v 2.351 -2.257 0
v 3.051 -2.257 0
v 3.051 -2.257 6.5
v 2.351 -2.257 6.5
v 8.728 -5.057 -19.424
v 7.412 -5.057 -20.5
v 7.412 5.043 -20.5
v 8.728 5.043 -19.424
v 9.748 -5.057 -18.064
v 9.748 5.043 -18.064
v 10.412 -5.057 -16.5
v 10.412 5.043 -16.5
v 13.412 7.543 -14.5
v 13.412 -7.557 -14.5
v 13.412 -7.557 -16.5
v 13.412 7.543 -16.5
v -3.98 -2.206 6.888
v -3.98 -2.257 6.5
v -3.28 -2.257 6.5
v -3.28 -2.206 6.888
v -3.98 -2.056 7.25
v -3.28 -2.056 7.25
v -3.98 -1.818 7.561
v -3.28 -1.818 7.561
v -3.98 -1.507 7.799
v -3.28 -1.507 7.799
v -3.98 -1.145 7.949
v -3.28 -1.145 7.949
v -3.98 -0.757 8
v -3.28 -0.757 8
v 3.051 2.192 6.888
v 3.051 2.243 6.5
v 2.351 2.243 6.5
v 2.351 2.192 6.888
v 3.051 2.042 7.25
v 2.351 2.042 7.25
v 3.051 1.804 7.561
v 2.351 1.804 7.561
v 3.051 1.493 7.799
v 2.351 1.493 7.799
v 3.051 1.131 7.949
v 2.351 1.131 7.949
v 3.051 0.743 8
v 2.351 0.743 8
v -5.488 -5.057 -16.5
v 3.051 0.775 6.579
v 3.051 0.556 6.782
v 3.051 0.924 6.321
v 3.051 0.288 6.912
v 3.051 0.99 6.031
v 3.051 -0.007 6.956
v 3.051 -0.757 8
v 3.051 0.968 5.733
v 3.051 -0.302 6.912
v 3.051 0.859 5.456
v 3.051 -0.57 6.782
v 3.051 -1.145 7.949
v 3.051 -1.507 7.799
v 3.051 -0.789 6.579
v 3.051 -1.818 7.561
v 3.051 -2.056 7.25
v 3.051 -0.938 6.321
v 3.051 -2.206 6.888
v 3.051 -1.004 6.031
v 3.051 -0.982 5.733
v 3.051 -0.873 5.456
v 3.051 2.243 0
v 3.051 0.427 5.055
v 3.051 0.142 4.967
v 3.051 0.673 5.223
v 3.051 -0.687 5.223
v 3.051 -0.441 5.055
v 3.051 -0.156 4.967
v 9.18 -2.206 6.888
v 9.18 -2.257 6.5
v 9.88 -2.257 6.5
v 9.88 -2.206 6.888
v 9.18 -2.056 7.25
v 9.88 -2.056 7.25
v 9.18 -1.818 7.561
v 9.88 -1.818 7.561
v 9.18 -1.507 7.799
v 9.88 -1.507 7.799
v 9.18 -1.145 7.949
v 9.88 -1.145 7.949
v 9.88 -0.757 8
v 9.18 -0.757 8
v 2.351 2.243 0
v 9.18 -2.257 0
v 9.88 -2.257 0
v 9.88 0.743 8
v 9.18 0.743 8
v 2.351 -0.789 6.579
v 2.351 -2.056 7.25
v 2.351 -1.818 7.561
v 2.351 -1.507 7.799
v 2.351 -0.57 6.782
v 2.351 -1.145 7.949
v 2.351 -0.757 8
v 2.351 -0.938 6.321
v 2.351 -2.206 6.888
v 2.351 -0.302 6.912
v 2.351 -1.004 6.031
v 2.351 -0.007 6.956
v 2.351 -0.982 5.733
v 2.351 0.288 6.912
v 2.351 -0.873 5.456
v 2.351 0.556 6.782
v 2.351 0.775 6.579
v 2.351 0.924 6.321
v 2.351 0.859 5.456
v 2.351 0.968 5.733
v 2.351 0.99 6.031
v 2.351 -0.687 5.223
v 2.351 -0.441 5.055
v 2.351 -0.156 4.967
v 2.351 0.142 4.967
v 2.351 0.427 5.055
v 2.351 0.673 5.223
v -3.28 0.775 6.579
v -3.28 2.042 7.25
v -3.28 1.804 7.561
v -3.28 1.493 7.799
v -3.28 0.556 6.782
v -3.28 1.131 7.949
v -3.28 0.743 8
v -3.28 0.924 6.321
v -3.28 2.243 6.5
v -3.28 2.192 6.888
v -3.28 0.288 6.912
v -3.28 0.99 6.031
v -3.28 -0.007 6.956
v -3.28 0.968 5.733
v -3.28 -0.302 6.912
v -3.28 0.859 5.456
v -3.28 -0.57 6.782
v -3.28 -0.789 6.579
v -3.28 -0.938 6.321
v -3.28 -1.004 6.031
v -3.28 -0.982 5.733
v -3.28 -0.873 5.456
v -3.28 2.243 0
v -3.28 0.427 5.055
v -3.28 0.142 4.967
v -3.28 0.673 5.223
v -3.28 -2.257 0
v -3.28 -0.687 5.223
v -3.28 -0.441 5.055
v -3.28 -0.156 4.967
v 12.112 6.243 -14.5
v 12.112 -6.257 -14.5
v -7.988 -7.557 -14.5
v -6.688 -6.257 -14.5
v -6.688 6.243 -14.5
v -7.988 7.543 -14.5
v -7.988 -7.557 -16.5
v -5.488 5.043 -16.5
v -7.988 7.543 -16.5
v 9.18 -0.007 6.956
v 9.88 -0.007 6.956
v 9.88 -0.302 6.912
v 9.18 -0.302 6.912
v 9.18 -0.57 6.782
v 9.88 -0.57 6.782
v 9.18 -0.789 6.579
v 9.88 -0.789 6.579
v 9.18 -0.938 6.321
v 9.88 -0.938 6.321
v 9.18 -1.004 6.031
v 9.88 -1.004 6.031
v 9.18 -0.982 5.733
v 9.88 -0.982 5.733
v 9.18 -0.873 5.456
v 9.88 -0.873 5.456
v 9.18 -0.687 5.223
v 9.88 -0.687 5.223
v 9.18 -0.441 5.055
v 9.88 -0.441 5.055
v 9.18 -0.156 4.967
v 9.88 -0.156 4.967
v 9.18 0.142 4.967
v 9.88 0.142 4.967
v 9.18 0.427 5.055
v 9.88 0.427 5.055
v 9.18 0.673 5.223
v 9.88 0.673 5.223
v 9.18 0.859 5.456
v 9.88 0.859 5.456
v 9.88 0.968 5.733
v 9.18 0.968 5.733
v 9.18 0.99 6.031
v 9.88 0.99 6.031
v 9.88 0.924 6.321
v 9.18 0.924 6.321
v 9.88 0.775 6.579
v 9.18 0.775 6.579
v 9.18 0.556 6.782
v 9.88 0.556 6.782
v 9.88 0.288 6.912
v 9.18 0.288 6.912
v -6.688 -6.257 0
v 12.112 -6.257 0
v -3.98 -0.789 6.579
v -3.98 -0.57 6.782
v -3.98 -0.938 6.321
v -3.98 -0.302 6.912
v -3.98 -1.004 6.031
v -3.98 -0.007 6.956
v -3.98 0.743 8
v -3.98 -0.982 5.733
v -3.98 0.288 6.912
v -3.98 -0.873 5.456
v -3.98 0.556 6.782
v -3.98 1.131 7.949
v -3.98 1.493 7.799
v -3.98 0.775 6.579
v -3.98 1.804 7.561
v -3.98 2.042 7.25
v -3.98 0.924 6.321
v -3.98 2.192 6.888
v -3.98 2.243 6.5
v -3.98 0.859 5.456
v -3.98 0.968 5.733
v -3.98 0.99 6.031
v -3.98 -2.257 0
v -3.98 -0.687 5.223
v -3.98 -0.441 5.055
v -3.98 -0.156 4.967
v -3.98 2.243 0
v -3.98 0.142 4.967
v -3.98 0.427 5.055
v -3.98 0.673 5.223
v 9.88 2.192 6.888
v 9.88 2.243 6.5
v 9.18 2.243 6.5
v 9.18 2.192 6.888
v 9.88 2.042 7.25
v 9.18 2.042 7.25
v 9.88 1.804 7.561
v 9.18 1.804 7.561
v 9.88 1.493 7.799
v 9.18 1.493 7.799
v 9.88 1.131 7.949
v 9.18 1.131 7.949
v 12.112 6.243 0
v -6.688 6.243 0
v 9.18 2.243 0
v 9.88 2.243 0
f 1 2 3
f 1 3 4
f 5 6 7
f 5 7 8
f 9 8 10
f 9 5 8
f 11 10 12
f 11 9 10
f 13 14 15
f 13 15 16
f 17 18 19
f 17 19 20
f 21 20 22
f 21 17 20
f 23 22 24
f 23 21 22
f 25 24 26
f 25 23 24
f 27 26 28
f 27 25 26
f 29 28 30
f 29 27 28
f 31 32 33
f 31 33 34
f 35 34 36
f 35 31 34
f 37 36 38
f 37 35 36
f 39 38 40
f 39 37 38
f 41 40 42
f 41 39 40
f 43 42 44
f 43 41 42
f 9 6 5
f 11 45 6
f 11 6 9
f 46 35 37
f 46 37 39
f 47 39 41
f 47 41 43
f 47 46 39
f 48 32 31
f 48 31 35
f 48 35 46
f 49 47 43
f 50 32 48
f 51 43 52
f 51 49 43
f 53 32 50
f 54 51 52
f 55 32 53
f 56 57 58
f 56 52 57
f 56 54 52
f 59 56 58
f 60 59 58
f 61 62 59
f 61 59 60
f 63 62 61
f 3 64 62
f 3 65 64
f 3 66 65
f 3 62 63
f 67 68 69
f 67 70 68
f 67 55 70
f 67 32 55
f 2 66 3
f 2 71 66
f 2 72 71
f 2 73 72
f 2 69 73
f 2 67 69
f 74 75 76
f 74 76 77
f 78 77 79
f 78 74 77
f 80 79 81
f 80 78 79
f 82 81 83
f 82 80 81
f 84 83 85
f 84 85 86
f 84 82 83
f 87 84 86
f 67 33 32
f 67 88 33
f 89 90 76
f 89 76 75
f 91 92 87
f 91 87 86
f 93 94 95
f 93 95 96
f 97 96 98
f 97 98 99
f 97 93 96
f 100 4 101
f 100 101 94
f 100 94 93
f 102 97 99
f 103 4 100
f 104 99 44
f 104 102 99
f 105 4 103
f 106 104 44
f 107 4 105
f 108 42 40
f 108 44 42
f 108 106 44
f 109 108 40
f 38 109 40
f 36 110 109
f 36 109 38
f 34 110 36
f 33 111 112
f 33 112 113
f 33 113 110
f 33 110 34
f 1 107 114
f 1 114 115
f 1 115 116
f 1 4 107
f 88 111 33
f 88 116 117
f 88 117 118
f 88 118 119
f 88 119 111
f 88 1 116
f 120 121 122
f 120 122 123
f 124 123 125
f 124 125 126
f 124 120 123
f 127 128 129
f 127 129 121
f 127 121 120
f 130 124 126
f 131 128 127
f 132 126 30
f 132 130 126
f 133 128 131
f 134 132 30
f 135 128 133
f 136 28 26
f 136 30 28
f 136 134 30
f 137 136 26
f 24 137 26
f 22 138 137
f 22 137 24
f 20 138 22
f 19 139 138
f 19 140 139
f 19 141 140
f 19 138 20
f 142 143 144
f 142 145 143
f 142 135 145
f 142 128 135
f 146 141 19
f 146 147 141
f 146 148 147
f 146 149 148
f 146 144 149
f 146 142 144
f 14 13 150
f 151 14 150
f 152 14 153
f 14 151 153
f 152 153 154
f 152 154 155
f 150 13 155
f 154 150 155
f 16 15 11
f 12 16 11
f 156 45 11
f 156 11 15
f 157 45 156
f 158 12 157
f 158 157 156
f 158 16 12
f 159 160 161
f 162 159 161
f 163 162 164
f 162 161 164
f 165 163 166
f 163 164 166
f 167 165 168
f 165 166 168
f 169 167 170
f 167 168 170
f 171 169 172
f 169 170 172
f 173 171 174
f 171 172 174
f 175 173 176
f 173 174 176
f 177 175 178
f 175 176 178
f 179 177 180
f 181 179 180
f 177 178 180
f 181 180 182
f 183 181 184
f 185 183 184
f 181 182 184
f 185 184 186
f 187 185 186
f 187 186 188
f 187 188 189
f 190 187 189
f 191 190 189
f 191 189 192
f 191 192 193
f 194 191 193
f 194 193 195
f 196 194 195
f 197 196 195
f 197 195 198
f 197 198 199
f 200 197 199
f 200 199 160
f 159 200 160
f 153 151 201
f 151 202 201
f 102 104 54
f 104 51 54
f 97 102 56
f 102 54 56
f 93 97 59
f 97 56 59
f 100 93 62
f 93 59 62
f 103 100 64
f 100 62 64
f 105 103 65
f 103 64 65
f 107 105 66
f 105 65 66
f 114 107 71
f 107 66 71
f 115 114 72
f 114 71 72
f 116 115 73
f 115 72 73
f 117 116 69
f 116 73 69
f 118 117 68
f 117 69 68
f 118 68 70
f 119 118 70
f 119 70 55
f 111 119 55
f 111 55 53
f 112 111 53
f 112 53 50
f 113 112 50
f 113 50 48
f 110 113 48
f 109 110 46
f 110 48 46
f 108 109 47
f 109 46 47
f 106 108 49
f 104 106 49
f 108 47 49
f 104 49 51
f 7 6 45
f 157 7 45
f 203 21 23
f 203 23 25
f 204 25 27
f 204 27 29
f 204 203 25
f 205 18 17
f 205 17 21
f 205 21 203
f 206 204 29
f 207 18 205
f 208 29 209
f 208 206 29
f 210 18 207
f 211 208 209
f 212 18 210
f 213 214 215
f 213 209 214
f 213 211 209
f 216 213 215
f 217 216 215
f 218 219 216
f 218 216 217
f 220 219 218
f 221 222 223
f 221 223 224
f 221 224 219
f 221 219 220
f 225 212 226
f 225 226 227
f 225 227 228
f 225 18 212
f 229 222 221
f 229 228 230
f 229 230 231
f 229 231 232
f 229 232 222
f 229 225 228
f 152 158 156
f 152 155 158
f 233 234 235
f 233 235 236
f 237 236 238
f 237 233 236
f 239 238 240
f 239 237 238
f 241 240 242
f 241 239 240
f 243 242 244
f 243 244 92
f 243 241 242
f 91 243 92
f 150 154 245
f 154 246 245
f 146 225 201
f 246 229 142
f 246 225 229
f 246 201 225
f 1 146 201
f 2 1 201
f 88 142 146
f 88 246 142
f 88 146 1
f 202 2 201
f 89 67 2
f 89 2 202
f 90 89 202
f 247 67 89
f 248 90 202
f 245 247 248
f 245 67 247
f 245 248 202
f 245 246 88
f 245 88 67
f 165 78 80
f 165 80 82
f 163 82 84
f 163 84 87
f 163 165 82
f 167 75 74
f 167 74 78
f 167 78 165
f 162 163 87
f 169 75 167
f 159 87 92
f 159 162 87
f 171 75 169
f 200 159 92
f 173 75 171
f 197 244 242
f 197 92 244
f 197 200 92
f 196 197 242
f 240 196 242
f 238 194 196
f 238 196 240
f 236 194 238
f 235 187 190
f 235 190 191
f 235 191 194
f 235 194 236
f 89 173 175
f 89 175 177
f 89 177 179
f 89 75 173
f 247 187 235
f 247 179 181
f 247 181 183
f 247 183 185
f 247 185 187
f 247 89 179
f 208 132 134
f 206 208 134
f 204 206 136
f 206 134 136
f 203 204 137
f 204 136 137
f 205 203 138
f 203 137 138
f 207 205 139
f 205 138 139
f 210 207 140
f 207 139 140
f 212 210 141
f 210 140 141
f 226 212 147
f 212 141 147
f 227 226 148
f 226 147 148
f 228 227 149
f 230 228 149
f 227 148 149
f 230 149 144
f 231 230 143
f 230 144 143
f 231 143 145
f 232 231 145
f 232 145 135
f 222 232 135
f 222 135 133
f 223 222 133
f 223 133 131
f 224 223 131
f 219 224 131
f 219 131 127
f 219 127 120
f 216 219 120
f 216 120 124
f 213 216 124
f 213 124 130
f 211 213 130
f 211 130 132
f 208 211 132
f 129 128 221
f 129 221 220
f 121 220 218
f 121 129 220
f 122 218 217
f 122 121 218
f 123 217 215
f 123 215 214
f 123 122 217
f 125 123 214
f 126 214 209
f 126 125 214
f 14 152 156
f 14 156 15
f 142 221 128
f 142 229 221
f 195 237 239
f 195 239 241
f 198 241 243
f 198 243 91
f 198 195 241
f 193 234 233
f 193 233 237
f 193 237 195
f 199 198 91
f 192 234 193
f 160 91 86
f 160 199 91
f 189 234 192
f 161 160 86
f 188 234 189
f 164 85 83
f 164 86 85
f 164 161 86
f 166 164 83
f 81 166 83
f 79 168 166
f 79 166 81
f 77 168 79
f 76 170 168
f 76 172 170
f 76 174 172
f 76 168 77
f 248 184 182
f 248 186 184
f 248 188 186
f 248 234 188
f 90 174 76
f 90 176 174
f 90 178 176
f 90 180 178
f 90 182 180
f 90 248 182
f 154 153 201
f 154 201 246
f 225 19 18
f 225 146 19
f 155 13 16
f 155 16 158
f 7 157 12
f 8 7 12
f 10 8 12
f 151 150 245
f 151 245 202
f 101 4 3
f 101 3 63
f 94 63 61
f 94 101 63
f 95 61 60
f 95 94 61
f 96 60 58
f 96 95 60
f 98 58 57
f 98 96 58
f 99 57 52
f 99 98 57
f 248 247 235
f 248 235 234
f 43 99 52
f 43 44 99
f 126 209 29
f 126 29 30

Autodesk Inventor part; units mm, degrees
ref_plane "YZ Plane" through (0, 0, 0) normal (1, 0, 0) x (0, 1, 0)
ref_plane "XZ Plane" through (0, 0, 0) normal (0, 1, 0) x (-1, 0, 0)
sketch "Szkic1" plane through (0, 0, 0) normal (0, 0, 1) x (1, 0, 0)
  line L0 (-6.6876, 6.2431) -> (12.1124, 6.2431)
  line L1 (12.1124, 6.2431) -> (12.1124, -6.2569)
  line L2 (12.1124, -6.2569) -> (-6.6876, -6.2569)
  line L3 (-6.6876, -6.2569) -> (-6.6876, 6.2431)
  line L4 (-3.9802, 2.2431) -> (-3.2802, 2.2431)
  line L5 (-3.2802, 2.2431) -> (-3.2802, -2.2569)
  line L6 (-3.2802, -2.2569) -> (-3.9802, -2.2569)
  line L7 (-3.9802, -2.2569) -> (-3.9802, 2.2431)
  line L8 (2.3508, 2.2431) -> (3.0508, 2.2431)
  line L9 (3.0508, 2.2431) -> (3.0508, -2.2569)
  line L10 (3.0508, -2.2569) -> (2.3508, -2.2569)
  line L11 (2.3508, -2.2569) -> (2.3508, 2.2431)
  line L12 (9.1799, 2.2431) -> (9.8799, 2.2431)
  line L13 (9.8799, 2.2431) -> (9.8799, -2.2569)
  line L14 (9.8799, -2.2569) -> (9.1799, -2.2569)
  line L15 (9.1799, -2.2569) -> (9.1799, 2.2431)
  point P0 (0, 0)
  dimension "d0" = 18.8
  dimension "d1" = 12.5
  dimension "d2" = 0.7
  dimension "d3" = 4.5
  dimension "d4" = 4
  dimension "d5" = 0.7
  dimension "d6" = 4.5
  dimension "d7" = 0.7
  dimension "d8" = 4.5
extrude "Wyciągnięcie proste1" add sketch "Szkic1" against normal blind 14.5 contours L0 L1 L2 L3 | L4 L5 L6 L7 | L8 L9 L10 L11 | L12 L13 L14 L15
extrude "Wyciągnięcie proste2" add sketch "Szkic1" along normal blind 8 contours L4 L5 L6 L7 | L8 L9 L10 L11 | L12 L13 L14 L15
fillet "Zaokrąglenie1" radius 1.5 6 edges at (-3.6302, 2.2431, 8) (2.7008, 2.2431, 8) (9.5299, 2.2431, 8) (-3.6302, -2.2569, 8) (2.7008, -2.2569, 8) (9.5299, -2.2569, 8)
sketch "Szkic2" plane through (0, 0, -14.5) normal (0, 0, -1) x (-1, 0, 0)
  line L0 (6.6876, 6.2431) -> (-12.1124, 6.2431) projected
  line L1 (-12.1124, 6.2431) -> (-12.1124, -6.2569) projected
  line L2 (-12.1124, -6.2569) -> (6.6876, -6.2569) projected
  line L3 (6.6876, -6.2569) -> (6.6876, 6.2431) projected
  line L4 (-13.4124, 7.5431) -> (7.9876, 7.5431)
  line L5 (7.9876, 7.5431) -> (7.9876, -7.5569)
  line L6 (7.9876, -7.5569) -> (-13.4124, -7.5569)
  line L7 (-13.4124, -7.5569) -> (-13.4124, 7.5431)
  point P0 (0, 0)
  dimension "d14" = 18.8
  dimension "d15" = 1.3
extrude "Wyciągnięcie proste3" add sketch "Szkic2" along normal blind 2 contours L3 L2 L1 L0 | L4 L5 L6 L7
sketch "Szkic3" plane through (-3.9802, -2.2569, 0) normal (-1, 0, 0) x (0, 0, 1)
  line L0 (0, 4.5) -> (6.5, 4.5) projected
  line L1 (0, 0) -> (6.5, 0) projected
  point P0 (0, 2.2569)
  point P1 (5.956, 2.25)
  dimension "d18" = 4.5
  dimension "d19" = 2.25
hole "Otwór1" at (-3.9802, -0.0069, 5.956) direction (1, 0, 0) diameter 2 end through all
ref_plane "Płaszczyzna konstrukcyjna1" through (-7.9876, -5.0569, -14.5) normal (0, -1, 0) x (1, 0, 0)
sketch "Szkic4" plane through (-7.9876, -5.0569, -14.5) normal (0, -1, 0) x (1, 0, 0)
  line L0 (21.4, 0) -> (0, 0) projected
  line L1 (21.4, 0) -> (21.4, -2) projected
  line L2 (0, -2) -> (21.4, -2) projected
  line L3 (0, 0) -> (0, -2) projected
  line L4 (0, -2) -> (21.4, -2) projected
  arc A0 (15.4, -6) -> (18.4, -2) centre (11.6248, -0.0436) ccw
  line L5 (15.4, -6) -> (2.5, -2)
  point P0 (7.9876, 14.5)
  dimension "d28" = 3
  dimension "d29" = 2.5
  dimension "d30" = 4
  dimension "d31" = 6
extrude "Wyciągnięcie proste4" add sketch "Szkic4" against normal blind 10.1 contours A0 L5 L2
sketch "Szkic5" plane through (-5.4876, -5.0569, -16.5) normal (-0.2962, 0, -0.9551) x (-0.9551, 0, 0.2962)
  line L0 (-13.2267, 2.4266) -> (-13.2267, 8.6477) construction
  line L1 (-13.2267, 8.6477) -> (-8.9095, 8.6477) construction
  line L2 (-8.9095, 8.6477) -> (-8.9095, 2.4266) construction
  line L3 (-8.9095, 2.4266) -> (-13.2267, 2.4266) construction
  line L4 (-6.957, 3.6505) -> (-6.957, 6.2802) construction
  line L5 (-6.957, 6.2802) -> (-0.4173, 6.2802) construction
  line L6 (-0.4173, 6.2802) -> (-0.4173, 3.6505) construction
  line L7 (-0.4173, 3.6505) -> (-6.957, 3.6505) construction
equation "\"d4\" = -0.5 * d3 + 0.5 * d1"
equation "\"d19\" = 0.5 * d18"
properties part number "COTS_GENERIC_AC_Power_Switch_5A"
